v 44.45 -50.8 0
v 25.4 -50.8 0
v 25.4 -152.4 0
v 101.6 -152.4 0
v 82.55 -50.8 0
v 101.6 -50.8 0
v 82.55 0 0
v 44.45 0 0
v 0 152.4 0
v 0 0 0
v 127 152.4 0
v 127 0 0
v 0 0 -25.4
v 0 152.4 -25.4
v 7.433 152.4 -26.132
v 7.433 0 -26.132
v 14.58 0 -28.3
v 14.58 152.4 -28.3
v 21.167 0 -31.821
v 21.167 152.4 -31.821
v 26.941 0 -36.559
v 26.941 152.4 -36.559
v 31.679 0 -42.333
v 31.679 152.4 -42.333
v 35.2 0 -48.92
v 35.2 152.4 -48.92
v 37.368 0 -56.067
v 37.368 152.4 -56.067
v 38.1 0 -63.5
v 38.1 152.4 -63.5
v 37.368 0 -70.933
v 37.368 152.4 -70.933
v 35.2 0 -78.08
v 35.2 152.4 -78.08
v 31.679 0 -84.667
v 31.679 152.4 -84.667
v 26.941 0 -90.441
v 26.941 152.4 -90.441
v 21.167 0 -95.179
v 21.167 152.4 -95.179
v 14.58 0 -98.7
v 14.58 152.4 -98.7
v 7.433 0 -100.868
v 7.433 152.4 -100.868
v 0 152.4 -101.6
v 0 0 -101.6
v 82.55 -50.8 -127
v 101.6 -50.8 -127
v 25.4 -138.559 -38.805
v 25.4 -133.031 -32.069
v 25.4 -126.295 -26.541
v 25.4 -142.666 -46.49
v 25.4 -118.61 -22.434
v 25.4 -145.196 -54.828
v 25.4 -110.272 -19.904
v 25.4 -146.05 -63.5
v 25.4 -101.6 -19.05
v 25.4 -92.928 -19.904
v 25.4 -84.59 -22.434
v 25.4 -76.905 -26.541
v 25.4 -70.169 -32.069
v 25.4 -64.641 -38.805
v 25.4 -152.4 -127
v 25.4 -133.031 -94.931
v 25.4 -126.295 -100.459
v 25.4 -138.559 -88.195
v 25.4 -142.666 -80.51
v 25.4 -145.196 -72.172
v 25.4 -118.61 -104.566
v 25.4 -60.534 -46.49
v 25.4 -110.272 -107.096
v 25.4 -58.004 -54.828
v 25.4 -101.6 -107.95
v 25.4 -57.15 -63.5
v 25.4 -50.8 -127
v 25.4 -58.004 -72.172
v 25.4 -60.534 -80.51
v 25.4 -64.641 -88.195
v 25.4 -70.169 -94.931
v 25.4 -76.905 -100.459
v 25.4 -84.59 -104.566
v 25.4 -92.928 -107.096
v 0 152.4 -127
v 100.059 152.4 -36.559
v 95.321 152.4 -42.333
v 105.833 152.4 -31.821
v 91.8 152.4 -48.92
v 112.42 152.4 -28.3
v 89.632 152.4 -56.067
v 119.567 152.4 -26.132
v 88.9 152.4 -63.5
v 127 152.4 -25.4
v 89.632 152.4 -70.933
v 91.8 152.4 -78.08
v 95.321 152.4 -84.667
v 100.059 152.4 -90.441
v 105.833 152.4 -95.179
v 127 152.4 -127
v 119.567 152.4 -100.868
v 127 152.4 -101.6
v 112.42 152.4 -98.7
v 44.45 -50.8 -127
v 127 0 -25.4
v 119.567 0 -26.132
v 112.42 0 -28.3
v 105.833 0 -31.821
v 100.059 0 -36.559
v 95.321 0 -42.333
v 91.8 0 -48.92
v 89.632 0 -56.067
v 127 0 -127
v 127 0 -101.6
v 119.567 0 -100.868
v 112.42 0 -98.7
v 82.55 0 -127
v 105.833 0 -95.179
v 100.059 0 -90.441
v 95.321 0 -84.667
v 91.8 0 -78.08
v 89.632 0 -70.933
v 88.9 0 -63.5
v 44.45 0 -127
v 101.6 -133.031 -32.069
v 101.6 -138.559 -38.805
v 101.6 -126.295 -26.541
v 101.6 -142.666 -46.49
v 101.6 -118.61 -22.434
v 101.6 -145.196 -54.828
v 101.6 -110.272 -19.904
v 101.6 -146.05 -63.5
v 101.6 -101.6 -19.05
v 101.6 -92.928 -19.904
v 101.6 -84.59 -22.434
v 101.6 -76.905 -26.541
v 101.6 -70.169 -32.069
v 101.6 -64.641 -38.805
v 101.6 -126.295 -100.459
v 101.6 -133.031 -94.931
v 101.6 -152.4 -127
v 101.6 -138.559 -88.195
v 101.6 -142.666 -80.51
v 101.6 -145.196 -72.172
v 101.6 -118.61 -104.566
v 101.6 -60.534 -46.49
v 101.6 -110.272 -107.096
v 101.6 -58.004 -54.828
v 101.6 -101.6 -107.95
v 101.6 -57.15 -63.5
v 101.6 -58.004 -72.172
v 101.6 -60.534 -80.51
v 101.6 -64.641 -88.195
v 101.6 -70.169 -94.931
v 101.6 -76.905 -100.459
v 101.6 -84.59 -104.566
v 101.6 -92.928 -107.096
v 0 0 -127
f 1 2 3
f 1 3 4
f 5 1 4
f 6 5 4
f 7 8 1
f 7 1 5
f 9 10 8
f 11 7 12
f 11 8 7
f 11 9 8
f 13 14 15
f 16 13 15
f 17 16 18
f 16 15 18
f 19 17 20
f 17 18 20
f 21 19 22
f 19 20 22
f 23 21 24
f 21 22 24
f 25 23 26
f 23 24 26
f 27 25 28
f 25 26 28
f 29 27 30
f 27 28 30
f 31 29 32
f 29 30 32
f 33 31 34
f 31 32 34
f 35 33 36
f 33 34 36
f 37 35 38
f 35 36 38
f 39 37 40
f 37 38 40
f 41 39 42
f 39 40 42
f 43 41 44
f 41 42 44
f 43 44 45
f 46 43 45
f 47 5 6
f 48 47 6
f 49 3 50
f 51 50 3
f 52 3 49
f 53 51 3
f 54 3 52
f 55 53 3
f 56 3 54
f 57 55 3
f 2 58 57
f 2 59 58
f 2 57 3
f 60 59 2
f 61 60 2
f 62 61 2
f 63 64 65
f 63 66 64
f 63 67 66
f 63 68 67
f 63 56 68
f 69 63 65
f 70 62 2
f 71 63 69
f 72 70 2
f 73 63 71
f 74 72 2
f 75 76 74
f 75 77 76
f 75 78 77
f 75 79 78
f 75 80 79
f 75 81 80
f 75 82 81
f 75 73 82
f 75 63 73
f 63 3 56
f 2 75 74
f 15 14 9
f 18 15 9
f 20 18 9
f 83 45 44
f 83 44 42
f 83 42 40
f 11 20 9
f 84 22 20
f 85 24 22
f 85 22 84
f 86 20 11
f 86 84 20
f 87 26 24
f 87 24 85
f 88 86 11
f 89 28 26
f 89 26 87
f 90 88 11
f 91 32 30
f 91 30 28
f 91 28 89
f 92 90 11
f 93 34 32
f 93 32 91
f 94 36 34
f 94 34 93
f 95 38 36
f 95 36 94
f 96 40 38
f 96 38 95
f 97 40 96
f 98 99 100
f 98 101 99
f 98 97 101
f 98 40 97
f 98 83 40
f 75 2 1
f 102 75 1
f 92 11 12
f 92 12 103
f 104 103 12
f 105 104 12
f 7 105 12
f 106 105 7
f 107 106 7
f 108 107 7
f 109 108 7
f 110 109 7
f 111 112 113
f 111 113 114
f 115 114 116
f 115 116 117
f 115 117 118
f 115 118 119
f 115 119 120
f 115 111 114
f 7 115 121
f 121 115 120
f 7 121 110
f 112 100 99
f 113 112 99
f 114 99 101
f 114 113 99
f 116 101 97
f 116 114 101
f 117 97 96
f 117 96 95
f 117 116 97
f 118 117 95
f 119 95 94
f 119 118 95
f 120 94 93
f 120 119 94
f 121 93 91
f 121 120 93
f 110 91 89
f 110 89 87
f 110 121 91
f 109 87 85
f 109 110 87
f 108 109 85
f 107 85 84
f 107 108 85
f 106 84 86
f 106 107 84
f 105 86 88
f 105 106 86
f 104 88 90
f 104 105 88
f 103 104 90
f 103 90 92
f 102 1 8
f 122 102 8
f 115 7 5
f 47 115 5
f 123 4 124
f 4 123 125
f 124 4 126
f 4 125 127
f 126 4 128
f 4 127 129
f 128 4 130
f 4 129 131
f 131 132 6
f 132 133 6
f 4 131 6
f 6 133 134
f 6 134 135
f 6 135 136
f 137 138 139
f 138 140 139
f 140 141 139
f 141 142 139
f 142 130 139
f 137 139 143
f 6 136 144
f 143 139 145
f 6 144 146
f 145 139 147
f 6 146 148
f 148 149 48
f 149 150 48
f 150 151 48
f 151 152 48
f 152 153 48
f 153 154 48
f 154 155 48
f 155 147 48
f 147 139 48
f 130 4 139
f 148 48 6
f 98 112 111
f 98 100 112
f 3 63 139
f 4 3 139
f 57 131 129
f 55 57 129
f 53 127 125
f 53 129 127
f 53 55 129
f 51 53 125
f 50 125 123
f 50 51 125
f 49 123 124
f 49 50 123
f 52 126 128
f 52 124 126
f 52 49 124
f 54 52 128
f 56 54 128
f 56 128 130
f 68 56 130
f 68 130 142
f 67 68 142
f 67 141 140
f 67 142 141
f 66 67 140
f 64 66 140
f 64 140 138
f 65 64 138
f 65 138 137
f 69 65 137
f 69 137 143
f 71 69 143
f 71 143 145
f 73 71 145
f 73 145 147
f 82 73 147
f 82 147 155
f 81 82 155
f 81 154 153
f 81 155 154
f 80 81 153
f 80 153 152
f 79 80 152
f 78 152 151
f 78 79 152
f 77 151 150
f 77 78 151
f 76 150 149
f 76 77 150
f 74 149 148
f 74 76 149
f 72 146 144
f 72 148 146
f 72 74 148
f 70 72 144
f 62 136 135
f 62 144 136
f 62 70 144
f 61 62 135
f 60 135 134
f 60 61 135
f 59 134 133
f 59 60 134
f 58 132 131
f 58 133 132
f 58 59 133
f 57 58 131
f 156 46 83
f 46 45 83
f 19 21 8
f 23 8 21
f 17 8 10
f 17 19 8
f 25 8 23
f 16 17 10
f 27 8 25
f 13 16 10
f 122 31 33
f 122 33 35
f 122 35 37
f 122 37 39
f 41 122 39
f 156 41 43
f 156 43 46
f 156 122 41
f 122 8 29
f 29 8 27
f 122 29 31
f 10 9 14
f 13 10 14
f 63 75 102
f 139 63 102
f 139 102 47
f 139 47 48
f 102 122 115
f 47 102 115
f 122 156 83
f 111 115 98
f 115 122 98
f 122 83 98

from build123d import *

# Parameters (mm, degrees)
SKETCH1_W               = 127
SKETCH1_H               = 127
BOSS_EXTRUDE1_DEPTH     = 152.4
SKETCH2_R               = 31.172448383
SKETCH2_R_2             = 38.1
CUT_EXTRUDE1_DEPTH      = 152.4
CUT_EXTRUDE1_DEPTH_BACK = 152.4
SKETCH3_W               = 127
SKETCH3_H               = 127
BOSS_EXTRUDE2_DEPTH     = 152.4
CUT_EXTRUDE_THIN3_DEPTH = 152.4
SKETCH6_R               = 44.45
CUT_EXTRUDE6_DEPTH      = 249.428
CUT_EXTRUDE6_DEPTH_BACK = 249.428
SKETCH7_W               = 25.4
SKETCH7_H               = 101.6
CUT_EXTRUDE8_DEPTH      = 143.256
SKETCH9_R               = 38.1
CUT_EXTRUDE9_DEPTH      = 152.4


with BuildPart() as part:
    # Sketch1 → Boss-Extrude1 (new body)
    with BuildSketch(Plane(origin=(0, 0, 0), x_dir=(1, 0, 0), z_dir=(0, 1, 0))):
        with Locations((63.5, 63.5)):
            Rectangle(SKETCH1_W, SKETCH1_H)
    extrude(amount=BOSS_EXTRUDE1_DEPTH)

    # Sketch2 → Cut-Extrude1 (cut, two sides)
    with BuildSketch(Plane(origin=(0, 0, 0), x_dir=(1, 0, 0), z_dir=(0, 1, 0))) as cut_extrude1_sk:
        with Locations((0, 63.5)):
            Circle(SKETCH2_R)
        with Locations((127, 63.5)):
            Circle(SKETCH2_R_2)
    extrude(amount=CUT_EXTRUDE1_DEPTH, mode=Mode.SUBTRACT)
    extrude(cut_extrude1_sk.sketch, amount=-CUT_EXTRUDE1_DEPTH_BACK, mode=Mode.SUBTRACT)

    # Sketch3 → Boss-Extrude2 (add)
    with BuildSketch(Plane(origin=(0, 0, 0), x_dir=(1, 0, 0), z_dir=(0, 1, 0))):
        with Locations((63.5, 63.5)):
            Rectangle(SKETCH3_W, SKETCH3_H)
    extrude(amount=-BOSS_EXTRUDE2_DEPTH)

    # Sketch5 → Cut-Extrude-Thin3 (cut)
    with BuildSketch(Plane(origin=(0, 0, -129.54), x_dir=(-1, 0, 0), z_dir=(0, 0, -1))):
        Polygon((-127, 0), (-82.55, 0), (-82.55, -50.8), (-127, -50.8), (-127, -48.26), (-85.09, -48.26), (-85.09, -2.54), (-127, -2.54), align=None)
        Polygon((0, -50.8), (-44.45, -50.8), (-44.45, 0), (0, 0), (0, -2.54), (-41.91, -2.54), (-41.91, -48.26), (0, -48.26), align=None)
    extrude(amount=-CUT_EXTRUDE_THIN3_DEPTH, mode=Mode.SUBTRACT)


with BuildPart() as body_2:
    # of the pieces the cut leaves, the one that is kept (cut_extrude_thin3_keep)
    add(part.part.solids().sort_by_distance((0, 152.4, 0))[0])

    # Sketch6 → Cut-Extrude6 (cut, two sides)
    with BuildSketch(Plane(origin=(0, 0, 0), x_dir=(0, 0, -1), z_dir=(1, 0, 0))) as cut_extrude6_sk:
        with Locations(Location((63.5, -101.6, 0), (0, 0, 180))):
            Circle(SKETCH6_R)
    extrude(amount=CUT_EXTRUDE6_DEPTH, mode=Mode.SUBTRACT)
    extrude(cut_extrude6_sk.sketch, amount=-CUT_EXTRUDE6_DEPTH_BACK, mode=Mode.SUBTRACT)

    # Sketch7 → Cut-Extrude8 (cut)
    with BuildSketch(Plane(origin=(0, 0, -129.54), x_dir=(-1, 0, 0), z_dir=(0, 0, -1))):
        with Locations((-114.3, -101.6)):
            Rectangle(SKETCH7_W, SKETCH7_H)
        with Locations((-12.7, -101.6)):
            Rectangle(SKETCH7_W, SKETCH7_H)
    extrude(amount=-CUT_EXTRUDE8_DEPTH, mode=Mode.SUBTRACT)

    # Sketch9 → Cut-Extrude9 (cut)
    with BuildSketch(Plane(origin=(0, 152.4, 0), x_dir=(1, 0, 0), z_dir=(0, 1, 0))):
        with Locations((0, 63.5)):
            Circle(SKETCH9_R)
    extrude(amount=-CUT_EXTRUDE9_DEPTH, mode=Mode.SUBTRACT)


solid = body_2.part
